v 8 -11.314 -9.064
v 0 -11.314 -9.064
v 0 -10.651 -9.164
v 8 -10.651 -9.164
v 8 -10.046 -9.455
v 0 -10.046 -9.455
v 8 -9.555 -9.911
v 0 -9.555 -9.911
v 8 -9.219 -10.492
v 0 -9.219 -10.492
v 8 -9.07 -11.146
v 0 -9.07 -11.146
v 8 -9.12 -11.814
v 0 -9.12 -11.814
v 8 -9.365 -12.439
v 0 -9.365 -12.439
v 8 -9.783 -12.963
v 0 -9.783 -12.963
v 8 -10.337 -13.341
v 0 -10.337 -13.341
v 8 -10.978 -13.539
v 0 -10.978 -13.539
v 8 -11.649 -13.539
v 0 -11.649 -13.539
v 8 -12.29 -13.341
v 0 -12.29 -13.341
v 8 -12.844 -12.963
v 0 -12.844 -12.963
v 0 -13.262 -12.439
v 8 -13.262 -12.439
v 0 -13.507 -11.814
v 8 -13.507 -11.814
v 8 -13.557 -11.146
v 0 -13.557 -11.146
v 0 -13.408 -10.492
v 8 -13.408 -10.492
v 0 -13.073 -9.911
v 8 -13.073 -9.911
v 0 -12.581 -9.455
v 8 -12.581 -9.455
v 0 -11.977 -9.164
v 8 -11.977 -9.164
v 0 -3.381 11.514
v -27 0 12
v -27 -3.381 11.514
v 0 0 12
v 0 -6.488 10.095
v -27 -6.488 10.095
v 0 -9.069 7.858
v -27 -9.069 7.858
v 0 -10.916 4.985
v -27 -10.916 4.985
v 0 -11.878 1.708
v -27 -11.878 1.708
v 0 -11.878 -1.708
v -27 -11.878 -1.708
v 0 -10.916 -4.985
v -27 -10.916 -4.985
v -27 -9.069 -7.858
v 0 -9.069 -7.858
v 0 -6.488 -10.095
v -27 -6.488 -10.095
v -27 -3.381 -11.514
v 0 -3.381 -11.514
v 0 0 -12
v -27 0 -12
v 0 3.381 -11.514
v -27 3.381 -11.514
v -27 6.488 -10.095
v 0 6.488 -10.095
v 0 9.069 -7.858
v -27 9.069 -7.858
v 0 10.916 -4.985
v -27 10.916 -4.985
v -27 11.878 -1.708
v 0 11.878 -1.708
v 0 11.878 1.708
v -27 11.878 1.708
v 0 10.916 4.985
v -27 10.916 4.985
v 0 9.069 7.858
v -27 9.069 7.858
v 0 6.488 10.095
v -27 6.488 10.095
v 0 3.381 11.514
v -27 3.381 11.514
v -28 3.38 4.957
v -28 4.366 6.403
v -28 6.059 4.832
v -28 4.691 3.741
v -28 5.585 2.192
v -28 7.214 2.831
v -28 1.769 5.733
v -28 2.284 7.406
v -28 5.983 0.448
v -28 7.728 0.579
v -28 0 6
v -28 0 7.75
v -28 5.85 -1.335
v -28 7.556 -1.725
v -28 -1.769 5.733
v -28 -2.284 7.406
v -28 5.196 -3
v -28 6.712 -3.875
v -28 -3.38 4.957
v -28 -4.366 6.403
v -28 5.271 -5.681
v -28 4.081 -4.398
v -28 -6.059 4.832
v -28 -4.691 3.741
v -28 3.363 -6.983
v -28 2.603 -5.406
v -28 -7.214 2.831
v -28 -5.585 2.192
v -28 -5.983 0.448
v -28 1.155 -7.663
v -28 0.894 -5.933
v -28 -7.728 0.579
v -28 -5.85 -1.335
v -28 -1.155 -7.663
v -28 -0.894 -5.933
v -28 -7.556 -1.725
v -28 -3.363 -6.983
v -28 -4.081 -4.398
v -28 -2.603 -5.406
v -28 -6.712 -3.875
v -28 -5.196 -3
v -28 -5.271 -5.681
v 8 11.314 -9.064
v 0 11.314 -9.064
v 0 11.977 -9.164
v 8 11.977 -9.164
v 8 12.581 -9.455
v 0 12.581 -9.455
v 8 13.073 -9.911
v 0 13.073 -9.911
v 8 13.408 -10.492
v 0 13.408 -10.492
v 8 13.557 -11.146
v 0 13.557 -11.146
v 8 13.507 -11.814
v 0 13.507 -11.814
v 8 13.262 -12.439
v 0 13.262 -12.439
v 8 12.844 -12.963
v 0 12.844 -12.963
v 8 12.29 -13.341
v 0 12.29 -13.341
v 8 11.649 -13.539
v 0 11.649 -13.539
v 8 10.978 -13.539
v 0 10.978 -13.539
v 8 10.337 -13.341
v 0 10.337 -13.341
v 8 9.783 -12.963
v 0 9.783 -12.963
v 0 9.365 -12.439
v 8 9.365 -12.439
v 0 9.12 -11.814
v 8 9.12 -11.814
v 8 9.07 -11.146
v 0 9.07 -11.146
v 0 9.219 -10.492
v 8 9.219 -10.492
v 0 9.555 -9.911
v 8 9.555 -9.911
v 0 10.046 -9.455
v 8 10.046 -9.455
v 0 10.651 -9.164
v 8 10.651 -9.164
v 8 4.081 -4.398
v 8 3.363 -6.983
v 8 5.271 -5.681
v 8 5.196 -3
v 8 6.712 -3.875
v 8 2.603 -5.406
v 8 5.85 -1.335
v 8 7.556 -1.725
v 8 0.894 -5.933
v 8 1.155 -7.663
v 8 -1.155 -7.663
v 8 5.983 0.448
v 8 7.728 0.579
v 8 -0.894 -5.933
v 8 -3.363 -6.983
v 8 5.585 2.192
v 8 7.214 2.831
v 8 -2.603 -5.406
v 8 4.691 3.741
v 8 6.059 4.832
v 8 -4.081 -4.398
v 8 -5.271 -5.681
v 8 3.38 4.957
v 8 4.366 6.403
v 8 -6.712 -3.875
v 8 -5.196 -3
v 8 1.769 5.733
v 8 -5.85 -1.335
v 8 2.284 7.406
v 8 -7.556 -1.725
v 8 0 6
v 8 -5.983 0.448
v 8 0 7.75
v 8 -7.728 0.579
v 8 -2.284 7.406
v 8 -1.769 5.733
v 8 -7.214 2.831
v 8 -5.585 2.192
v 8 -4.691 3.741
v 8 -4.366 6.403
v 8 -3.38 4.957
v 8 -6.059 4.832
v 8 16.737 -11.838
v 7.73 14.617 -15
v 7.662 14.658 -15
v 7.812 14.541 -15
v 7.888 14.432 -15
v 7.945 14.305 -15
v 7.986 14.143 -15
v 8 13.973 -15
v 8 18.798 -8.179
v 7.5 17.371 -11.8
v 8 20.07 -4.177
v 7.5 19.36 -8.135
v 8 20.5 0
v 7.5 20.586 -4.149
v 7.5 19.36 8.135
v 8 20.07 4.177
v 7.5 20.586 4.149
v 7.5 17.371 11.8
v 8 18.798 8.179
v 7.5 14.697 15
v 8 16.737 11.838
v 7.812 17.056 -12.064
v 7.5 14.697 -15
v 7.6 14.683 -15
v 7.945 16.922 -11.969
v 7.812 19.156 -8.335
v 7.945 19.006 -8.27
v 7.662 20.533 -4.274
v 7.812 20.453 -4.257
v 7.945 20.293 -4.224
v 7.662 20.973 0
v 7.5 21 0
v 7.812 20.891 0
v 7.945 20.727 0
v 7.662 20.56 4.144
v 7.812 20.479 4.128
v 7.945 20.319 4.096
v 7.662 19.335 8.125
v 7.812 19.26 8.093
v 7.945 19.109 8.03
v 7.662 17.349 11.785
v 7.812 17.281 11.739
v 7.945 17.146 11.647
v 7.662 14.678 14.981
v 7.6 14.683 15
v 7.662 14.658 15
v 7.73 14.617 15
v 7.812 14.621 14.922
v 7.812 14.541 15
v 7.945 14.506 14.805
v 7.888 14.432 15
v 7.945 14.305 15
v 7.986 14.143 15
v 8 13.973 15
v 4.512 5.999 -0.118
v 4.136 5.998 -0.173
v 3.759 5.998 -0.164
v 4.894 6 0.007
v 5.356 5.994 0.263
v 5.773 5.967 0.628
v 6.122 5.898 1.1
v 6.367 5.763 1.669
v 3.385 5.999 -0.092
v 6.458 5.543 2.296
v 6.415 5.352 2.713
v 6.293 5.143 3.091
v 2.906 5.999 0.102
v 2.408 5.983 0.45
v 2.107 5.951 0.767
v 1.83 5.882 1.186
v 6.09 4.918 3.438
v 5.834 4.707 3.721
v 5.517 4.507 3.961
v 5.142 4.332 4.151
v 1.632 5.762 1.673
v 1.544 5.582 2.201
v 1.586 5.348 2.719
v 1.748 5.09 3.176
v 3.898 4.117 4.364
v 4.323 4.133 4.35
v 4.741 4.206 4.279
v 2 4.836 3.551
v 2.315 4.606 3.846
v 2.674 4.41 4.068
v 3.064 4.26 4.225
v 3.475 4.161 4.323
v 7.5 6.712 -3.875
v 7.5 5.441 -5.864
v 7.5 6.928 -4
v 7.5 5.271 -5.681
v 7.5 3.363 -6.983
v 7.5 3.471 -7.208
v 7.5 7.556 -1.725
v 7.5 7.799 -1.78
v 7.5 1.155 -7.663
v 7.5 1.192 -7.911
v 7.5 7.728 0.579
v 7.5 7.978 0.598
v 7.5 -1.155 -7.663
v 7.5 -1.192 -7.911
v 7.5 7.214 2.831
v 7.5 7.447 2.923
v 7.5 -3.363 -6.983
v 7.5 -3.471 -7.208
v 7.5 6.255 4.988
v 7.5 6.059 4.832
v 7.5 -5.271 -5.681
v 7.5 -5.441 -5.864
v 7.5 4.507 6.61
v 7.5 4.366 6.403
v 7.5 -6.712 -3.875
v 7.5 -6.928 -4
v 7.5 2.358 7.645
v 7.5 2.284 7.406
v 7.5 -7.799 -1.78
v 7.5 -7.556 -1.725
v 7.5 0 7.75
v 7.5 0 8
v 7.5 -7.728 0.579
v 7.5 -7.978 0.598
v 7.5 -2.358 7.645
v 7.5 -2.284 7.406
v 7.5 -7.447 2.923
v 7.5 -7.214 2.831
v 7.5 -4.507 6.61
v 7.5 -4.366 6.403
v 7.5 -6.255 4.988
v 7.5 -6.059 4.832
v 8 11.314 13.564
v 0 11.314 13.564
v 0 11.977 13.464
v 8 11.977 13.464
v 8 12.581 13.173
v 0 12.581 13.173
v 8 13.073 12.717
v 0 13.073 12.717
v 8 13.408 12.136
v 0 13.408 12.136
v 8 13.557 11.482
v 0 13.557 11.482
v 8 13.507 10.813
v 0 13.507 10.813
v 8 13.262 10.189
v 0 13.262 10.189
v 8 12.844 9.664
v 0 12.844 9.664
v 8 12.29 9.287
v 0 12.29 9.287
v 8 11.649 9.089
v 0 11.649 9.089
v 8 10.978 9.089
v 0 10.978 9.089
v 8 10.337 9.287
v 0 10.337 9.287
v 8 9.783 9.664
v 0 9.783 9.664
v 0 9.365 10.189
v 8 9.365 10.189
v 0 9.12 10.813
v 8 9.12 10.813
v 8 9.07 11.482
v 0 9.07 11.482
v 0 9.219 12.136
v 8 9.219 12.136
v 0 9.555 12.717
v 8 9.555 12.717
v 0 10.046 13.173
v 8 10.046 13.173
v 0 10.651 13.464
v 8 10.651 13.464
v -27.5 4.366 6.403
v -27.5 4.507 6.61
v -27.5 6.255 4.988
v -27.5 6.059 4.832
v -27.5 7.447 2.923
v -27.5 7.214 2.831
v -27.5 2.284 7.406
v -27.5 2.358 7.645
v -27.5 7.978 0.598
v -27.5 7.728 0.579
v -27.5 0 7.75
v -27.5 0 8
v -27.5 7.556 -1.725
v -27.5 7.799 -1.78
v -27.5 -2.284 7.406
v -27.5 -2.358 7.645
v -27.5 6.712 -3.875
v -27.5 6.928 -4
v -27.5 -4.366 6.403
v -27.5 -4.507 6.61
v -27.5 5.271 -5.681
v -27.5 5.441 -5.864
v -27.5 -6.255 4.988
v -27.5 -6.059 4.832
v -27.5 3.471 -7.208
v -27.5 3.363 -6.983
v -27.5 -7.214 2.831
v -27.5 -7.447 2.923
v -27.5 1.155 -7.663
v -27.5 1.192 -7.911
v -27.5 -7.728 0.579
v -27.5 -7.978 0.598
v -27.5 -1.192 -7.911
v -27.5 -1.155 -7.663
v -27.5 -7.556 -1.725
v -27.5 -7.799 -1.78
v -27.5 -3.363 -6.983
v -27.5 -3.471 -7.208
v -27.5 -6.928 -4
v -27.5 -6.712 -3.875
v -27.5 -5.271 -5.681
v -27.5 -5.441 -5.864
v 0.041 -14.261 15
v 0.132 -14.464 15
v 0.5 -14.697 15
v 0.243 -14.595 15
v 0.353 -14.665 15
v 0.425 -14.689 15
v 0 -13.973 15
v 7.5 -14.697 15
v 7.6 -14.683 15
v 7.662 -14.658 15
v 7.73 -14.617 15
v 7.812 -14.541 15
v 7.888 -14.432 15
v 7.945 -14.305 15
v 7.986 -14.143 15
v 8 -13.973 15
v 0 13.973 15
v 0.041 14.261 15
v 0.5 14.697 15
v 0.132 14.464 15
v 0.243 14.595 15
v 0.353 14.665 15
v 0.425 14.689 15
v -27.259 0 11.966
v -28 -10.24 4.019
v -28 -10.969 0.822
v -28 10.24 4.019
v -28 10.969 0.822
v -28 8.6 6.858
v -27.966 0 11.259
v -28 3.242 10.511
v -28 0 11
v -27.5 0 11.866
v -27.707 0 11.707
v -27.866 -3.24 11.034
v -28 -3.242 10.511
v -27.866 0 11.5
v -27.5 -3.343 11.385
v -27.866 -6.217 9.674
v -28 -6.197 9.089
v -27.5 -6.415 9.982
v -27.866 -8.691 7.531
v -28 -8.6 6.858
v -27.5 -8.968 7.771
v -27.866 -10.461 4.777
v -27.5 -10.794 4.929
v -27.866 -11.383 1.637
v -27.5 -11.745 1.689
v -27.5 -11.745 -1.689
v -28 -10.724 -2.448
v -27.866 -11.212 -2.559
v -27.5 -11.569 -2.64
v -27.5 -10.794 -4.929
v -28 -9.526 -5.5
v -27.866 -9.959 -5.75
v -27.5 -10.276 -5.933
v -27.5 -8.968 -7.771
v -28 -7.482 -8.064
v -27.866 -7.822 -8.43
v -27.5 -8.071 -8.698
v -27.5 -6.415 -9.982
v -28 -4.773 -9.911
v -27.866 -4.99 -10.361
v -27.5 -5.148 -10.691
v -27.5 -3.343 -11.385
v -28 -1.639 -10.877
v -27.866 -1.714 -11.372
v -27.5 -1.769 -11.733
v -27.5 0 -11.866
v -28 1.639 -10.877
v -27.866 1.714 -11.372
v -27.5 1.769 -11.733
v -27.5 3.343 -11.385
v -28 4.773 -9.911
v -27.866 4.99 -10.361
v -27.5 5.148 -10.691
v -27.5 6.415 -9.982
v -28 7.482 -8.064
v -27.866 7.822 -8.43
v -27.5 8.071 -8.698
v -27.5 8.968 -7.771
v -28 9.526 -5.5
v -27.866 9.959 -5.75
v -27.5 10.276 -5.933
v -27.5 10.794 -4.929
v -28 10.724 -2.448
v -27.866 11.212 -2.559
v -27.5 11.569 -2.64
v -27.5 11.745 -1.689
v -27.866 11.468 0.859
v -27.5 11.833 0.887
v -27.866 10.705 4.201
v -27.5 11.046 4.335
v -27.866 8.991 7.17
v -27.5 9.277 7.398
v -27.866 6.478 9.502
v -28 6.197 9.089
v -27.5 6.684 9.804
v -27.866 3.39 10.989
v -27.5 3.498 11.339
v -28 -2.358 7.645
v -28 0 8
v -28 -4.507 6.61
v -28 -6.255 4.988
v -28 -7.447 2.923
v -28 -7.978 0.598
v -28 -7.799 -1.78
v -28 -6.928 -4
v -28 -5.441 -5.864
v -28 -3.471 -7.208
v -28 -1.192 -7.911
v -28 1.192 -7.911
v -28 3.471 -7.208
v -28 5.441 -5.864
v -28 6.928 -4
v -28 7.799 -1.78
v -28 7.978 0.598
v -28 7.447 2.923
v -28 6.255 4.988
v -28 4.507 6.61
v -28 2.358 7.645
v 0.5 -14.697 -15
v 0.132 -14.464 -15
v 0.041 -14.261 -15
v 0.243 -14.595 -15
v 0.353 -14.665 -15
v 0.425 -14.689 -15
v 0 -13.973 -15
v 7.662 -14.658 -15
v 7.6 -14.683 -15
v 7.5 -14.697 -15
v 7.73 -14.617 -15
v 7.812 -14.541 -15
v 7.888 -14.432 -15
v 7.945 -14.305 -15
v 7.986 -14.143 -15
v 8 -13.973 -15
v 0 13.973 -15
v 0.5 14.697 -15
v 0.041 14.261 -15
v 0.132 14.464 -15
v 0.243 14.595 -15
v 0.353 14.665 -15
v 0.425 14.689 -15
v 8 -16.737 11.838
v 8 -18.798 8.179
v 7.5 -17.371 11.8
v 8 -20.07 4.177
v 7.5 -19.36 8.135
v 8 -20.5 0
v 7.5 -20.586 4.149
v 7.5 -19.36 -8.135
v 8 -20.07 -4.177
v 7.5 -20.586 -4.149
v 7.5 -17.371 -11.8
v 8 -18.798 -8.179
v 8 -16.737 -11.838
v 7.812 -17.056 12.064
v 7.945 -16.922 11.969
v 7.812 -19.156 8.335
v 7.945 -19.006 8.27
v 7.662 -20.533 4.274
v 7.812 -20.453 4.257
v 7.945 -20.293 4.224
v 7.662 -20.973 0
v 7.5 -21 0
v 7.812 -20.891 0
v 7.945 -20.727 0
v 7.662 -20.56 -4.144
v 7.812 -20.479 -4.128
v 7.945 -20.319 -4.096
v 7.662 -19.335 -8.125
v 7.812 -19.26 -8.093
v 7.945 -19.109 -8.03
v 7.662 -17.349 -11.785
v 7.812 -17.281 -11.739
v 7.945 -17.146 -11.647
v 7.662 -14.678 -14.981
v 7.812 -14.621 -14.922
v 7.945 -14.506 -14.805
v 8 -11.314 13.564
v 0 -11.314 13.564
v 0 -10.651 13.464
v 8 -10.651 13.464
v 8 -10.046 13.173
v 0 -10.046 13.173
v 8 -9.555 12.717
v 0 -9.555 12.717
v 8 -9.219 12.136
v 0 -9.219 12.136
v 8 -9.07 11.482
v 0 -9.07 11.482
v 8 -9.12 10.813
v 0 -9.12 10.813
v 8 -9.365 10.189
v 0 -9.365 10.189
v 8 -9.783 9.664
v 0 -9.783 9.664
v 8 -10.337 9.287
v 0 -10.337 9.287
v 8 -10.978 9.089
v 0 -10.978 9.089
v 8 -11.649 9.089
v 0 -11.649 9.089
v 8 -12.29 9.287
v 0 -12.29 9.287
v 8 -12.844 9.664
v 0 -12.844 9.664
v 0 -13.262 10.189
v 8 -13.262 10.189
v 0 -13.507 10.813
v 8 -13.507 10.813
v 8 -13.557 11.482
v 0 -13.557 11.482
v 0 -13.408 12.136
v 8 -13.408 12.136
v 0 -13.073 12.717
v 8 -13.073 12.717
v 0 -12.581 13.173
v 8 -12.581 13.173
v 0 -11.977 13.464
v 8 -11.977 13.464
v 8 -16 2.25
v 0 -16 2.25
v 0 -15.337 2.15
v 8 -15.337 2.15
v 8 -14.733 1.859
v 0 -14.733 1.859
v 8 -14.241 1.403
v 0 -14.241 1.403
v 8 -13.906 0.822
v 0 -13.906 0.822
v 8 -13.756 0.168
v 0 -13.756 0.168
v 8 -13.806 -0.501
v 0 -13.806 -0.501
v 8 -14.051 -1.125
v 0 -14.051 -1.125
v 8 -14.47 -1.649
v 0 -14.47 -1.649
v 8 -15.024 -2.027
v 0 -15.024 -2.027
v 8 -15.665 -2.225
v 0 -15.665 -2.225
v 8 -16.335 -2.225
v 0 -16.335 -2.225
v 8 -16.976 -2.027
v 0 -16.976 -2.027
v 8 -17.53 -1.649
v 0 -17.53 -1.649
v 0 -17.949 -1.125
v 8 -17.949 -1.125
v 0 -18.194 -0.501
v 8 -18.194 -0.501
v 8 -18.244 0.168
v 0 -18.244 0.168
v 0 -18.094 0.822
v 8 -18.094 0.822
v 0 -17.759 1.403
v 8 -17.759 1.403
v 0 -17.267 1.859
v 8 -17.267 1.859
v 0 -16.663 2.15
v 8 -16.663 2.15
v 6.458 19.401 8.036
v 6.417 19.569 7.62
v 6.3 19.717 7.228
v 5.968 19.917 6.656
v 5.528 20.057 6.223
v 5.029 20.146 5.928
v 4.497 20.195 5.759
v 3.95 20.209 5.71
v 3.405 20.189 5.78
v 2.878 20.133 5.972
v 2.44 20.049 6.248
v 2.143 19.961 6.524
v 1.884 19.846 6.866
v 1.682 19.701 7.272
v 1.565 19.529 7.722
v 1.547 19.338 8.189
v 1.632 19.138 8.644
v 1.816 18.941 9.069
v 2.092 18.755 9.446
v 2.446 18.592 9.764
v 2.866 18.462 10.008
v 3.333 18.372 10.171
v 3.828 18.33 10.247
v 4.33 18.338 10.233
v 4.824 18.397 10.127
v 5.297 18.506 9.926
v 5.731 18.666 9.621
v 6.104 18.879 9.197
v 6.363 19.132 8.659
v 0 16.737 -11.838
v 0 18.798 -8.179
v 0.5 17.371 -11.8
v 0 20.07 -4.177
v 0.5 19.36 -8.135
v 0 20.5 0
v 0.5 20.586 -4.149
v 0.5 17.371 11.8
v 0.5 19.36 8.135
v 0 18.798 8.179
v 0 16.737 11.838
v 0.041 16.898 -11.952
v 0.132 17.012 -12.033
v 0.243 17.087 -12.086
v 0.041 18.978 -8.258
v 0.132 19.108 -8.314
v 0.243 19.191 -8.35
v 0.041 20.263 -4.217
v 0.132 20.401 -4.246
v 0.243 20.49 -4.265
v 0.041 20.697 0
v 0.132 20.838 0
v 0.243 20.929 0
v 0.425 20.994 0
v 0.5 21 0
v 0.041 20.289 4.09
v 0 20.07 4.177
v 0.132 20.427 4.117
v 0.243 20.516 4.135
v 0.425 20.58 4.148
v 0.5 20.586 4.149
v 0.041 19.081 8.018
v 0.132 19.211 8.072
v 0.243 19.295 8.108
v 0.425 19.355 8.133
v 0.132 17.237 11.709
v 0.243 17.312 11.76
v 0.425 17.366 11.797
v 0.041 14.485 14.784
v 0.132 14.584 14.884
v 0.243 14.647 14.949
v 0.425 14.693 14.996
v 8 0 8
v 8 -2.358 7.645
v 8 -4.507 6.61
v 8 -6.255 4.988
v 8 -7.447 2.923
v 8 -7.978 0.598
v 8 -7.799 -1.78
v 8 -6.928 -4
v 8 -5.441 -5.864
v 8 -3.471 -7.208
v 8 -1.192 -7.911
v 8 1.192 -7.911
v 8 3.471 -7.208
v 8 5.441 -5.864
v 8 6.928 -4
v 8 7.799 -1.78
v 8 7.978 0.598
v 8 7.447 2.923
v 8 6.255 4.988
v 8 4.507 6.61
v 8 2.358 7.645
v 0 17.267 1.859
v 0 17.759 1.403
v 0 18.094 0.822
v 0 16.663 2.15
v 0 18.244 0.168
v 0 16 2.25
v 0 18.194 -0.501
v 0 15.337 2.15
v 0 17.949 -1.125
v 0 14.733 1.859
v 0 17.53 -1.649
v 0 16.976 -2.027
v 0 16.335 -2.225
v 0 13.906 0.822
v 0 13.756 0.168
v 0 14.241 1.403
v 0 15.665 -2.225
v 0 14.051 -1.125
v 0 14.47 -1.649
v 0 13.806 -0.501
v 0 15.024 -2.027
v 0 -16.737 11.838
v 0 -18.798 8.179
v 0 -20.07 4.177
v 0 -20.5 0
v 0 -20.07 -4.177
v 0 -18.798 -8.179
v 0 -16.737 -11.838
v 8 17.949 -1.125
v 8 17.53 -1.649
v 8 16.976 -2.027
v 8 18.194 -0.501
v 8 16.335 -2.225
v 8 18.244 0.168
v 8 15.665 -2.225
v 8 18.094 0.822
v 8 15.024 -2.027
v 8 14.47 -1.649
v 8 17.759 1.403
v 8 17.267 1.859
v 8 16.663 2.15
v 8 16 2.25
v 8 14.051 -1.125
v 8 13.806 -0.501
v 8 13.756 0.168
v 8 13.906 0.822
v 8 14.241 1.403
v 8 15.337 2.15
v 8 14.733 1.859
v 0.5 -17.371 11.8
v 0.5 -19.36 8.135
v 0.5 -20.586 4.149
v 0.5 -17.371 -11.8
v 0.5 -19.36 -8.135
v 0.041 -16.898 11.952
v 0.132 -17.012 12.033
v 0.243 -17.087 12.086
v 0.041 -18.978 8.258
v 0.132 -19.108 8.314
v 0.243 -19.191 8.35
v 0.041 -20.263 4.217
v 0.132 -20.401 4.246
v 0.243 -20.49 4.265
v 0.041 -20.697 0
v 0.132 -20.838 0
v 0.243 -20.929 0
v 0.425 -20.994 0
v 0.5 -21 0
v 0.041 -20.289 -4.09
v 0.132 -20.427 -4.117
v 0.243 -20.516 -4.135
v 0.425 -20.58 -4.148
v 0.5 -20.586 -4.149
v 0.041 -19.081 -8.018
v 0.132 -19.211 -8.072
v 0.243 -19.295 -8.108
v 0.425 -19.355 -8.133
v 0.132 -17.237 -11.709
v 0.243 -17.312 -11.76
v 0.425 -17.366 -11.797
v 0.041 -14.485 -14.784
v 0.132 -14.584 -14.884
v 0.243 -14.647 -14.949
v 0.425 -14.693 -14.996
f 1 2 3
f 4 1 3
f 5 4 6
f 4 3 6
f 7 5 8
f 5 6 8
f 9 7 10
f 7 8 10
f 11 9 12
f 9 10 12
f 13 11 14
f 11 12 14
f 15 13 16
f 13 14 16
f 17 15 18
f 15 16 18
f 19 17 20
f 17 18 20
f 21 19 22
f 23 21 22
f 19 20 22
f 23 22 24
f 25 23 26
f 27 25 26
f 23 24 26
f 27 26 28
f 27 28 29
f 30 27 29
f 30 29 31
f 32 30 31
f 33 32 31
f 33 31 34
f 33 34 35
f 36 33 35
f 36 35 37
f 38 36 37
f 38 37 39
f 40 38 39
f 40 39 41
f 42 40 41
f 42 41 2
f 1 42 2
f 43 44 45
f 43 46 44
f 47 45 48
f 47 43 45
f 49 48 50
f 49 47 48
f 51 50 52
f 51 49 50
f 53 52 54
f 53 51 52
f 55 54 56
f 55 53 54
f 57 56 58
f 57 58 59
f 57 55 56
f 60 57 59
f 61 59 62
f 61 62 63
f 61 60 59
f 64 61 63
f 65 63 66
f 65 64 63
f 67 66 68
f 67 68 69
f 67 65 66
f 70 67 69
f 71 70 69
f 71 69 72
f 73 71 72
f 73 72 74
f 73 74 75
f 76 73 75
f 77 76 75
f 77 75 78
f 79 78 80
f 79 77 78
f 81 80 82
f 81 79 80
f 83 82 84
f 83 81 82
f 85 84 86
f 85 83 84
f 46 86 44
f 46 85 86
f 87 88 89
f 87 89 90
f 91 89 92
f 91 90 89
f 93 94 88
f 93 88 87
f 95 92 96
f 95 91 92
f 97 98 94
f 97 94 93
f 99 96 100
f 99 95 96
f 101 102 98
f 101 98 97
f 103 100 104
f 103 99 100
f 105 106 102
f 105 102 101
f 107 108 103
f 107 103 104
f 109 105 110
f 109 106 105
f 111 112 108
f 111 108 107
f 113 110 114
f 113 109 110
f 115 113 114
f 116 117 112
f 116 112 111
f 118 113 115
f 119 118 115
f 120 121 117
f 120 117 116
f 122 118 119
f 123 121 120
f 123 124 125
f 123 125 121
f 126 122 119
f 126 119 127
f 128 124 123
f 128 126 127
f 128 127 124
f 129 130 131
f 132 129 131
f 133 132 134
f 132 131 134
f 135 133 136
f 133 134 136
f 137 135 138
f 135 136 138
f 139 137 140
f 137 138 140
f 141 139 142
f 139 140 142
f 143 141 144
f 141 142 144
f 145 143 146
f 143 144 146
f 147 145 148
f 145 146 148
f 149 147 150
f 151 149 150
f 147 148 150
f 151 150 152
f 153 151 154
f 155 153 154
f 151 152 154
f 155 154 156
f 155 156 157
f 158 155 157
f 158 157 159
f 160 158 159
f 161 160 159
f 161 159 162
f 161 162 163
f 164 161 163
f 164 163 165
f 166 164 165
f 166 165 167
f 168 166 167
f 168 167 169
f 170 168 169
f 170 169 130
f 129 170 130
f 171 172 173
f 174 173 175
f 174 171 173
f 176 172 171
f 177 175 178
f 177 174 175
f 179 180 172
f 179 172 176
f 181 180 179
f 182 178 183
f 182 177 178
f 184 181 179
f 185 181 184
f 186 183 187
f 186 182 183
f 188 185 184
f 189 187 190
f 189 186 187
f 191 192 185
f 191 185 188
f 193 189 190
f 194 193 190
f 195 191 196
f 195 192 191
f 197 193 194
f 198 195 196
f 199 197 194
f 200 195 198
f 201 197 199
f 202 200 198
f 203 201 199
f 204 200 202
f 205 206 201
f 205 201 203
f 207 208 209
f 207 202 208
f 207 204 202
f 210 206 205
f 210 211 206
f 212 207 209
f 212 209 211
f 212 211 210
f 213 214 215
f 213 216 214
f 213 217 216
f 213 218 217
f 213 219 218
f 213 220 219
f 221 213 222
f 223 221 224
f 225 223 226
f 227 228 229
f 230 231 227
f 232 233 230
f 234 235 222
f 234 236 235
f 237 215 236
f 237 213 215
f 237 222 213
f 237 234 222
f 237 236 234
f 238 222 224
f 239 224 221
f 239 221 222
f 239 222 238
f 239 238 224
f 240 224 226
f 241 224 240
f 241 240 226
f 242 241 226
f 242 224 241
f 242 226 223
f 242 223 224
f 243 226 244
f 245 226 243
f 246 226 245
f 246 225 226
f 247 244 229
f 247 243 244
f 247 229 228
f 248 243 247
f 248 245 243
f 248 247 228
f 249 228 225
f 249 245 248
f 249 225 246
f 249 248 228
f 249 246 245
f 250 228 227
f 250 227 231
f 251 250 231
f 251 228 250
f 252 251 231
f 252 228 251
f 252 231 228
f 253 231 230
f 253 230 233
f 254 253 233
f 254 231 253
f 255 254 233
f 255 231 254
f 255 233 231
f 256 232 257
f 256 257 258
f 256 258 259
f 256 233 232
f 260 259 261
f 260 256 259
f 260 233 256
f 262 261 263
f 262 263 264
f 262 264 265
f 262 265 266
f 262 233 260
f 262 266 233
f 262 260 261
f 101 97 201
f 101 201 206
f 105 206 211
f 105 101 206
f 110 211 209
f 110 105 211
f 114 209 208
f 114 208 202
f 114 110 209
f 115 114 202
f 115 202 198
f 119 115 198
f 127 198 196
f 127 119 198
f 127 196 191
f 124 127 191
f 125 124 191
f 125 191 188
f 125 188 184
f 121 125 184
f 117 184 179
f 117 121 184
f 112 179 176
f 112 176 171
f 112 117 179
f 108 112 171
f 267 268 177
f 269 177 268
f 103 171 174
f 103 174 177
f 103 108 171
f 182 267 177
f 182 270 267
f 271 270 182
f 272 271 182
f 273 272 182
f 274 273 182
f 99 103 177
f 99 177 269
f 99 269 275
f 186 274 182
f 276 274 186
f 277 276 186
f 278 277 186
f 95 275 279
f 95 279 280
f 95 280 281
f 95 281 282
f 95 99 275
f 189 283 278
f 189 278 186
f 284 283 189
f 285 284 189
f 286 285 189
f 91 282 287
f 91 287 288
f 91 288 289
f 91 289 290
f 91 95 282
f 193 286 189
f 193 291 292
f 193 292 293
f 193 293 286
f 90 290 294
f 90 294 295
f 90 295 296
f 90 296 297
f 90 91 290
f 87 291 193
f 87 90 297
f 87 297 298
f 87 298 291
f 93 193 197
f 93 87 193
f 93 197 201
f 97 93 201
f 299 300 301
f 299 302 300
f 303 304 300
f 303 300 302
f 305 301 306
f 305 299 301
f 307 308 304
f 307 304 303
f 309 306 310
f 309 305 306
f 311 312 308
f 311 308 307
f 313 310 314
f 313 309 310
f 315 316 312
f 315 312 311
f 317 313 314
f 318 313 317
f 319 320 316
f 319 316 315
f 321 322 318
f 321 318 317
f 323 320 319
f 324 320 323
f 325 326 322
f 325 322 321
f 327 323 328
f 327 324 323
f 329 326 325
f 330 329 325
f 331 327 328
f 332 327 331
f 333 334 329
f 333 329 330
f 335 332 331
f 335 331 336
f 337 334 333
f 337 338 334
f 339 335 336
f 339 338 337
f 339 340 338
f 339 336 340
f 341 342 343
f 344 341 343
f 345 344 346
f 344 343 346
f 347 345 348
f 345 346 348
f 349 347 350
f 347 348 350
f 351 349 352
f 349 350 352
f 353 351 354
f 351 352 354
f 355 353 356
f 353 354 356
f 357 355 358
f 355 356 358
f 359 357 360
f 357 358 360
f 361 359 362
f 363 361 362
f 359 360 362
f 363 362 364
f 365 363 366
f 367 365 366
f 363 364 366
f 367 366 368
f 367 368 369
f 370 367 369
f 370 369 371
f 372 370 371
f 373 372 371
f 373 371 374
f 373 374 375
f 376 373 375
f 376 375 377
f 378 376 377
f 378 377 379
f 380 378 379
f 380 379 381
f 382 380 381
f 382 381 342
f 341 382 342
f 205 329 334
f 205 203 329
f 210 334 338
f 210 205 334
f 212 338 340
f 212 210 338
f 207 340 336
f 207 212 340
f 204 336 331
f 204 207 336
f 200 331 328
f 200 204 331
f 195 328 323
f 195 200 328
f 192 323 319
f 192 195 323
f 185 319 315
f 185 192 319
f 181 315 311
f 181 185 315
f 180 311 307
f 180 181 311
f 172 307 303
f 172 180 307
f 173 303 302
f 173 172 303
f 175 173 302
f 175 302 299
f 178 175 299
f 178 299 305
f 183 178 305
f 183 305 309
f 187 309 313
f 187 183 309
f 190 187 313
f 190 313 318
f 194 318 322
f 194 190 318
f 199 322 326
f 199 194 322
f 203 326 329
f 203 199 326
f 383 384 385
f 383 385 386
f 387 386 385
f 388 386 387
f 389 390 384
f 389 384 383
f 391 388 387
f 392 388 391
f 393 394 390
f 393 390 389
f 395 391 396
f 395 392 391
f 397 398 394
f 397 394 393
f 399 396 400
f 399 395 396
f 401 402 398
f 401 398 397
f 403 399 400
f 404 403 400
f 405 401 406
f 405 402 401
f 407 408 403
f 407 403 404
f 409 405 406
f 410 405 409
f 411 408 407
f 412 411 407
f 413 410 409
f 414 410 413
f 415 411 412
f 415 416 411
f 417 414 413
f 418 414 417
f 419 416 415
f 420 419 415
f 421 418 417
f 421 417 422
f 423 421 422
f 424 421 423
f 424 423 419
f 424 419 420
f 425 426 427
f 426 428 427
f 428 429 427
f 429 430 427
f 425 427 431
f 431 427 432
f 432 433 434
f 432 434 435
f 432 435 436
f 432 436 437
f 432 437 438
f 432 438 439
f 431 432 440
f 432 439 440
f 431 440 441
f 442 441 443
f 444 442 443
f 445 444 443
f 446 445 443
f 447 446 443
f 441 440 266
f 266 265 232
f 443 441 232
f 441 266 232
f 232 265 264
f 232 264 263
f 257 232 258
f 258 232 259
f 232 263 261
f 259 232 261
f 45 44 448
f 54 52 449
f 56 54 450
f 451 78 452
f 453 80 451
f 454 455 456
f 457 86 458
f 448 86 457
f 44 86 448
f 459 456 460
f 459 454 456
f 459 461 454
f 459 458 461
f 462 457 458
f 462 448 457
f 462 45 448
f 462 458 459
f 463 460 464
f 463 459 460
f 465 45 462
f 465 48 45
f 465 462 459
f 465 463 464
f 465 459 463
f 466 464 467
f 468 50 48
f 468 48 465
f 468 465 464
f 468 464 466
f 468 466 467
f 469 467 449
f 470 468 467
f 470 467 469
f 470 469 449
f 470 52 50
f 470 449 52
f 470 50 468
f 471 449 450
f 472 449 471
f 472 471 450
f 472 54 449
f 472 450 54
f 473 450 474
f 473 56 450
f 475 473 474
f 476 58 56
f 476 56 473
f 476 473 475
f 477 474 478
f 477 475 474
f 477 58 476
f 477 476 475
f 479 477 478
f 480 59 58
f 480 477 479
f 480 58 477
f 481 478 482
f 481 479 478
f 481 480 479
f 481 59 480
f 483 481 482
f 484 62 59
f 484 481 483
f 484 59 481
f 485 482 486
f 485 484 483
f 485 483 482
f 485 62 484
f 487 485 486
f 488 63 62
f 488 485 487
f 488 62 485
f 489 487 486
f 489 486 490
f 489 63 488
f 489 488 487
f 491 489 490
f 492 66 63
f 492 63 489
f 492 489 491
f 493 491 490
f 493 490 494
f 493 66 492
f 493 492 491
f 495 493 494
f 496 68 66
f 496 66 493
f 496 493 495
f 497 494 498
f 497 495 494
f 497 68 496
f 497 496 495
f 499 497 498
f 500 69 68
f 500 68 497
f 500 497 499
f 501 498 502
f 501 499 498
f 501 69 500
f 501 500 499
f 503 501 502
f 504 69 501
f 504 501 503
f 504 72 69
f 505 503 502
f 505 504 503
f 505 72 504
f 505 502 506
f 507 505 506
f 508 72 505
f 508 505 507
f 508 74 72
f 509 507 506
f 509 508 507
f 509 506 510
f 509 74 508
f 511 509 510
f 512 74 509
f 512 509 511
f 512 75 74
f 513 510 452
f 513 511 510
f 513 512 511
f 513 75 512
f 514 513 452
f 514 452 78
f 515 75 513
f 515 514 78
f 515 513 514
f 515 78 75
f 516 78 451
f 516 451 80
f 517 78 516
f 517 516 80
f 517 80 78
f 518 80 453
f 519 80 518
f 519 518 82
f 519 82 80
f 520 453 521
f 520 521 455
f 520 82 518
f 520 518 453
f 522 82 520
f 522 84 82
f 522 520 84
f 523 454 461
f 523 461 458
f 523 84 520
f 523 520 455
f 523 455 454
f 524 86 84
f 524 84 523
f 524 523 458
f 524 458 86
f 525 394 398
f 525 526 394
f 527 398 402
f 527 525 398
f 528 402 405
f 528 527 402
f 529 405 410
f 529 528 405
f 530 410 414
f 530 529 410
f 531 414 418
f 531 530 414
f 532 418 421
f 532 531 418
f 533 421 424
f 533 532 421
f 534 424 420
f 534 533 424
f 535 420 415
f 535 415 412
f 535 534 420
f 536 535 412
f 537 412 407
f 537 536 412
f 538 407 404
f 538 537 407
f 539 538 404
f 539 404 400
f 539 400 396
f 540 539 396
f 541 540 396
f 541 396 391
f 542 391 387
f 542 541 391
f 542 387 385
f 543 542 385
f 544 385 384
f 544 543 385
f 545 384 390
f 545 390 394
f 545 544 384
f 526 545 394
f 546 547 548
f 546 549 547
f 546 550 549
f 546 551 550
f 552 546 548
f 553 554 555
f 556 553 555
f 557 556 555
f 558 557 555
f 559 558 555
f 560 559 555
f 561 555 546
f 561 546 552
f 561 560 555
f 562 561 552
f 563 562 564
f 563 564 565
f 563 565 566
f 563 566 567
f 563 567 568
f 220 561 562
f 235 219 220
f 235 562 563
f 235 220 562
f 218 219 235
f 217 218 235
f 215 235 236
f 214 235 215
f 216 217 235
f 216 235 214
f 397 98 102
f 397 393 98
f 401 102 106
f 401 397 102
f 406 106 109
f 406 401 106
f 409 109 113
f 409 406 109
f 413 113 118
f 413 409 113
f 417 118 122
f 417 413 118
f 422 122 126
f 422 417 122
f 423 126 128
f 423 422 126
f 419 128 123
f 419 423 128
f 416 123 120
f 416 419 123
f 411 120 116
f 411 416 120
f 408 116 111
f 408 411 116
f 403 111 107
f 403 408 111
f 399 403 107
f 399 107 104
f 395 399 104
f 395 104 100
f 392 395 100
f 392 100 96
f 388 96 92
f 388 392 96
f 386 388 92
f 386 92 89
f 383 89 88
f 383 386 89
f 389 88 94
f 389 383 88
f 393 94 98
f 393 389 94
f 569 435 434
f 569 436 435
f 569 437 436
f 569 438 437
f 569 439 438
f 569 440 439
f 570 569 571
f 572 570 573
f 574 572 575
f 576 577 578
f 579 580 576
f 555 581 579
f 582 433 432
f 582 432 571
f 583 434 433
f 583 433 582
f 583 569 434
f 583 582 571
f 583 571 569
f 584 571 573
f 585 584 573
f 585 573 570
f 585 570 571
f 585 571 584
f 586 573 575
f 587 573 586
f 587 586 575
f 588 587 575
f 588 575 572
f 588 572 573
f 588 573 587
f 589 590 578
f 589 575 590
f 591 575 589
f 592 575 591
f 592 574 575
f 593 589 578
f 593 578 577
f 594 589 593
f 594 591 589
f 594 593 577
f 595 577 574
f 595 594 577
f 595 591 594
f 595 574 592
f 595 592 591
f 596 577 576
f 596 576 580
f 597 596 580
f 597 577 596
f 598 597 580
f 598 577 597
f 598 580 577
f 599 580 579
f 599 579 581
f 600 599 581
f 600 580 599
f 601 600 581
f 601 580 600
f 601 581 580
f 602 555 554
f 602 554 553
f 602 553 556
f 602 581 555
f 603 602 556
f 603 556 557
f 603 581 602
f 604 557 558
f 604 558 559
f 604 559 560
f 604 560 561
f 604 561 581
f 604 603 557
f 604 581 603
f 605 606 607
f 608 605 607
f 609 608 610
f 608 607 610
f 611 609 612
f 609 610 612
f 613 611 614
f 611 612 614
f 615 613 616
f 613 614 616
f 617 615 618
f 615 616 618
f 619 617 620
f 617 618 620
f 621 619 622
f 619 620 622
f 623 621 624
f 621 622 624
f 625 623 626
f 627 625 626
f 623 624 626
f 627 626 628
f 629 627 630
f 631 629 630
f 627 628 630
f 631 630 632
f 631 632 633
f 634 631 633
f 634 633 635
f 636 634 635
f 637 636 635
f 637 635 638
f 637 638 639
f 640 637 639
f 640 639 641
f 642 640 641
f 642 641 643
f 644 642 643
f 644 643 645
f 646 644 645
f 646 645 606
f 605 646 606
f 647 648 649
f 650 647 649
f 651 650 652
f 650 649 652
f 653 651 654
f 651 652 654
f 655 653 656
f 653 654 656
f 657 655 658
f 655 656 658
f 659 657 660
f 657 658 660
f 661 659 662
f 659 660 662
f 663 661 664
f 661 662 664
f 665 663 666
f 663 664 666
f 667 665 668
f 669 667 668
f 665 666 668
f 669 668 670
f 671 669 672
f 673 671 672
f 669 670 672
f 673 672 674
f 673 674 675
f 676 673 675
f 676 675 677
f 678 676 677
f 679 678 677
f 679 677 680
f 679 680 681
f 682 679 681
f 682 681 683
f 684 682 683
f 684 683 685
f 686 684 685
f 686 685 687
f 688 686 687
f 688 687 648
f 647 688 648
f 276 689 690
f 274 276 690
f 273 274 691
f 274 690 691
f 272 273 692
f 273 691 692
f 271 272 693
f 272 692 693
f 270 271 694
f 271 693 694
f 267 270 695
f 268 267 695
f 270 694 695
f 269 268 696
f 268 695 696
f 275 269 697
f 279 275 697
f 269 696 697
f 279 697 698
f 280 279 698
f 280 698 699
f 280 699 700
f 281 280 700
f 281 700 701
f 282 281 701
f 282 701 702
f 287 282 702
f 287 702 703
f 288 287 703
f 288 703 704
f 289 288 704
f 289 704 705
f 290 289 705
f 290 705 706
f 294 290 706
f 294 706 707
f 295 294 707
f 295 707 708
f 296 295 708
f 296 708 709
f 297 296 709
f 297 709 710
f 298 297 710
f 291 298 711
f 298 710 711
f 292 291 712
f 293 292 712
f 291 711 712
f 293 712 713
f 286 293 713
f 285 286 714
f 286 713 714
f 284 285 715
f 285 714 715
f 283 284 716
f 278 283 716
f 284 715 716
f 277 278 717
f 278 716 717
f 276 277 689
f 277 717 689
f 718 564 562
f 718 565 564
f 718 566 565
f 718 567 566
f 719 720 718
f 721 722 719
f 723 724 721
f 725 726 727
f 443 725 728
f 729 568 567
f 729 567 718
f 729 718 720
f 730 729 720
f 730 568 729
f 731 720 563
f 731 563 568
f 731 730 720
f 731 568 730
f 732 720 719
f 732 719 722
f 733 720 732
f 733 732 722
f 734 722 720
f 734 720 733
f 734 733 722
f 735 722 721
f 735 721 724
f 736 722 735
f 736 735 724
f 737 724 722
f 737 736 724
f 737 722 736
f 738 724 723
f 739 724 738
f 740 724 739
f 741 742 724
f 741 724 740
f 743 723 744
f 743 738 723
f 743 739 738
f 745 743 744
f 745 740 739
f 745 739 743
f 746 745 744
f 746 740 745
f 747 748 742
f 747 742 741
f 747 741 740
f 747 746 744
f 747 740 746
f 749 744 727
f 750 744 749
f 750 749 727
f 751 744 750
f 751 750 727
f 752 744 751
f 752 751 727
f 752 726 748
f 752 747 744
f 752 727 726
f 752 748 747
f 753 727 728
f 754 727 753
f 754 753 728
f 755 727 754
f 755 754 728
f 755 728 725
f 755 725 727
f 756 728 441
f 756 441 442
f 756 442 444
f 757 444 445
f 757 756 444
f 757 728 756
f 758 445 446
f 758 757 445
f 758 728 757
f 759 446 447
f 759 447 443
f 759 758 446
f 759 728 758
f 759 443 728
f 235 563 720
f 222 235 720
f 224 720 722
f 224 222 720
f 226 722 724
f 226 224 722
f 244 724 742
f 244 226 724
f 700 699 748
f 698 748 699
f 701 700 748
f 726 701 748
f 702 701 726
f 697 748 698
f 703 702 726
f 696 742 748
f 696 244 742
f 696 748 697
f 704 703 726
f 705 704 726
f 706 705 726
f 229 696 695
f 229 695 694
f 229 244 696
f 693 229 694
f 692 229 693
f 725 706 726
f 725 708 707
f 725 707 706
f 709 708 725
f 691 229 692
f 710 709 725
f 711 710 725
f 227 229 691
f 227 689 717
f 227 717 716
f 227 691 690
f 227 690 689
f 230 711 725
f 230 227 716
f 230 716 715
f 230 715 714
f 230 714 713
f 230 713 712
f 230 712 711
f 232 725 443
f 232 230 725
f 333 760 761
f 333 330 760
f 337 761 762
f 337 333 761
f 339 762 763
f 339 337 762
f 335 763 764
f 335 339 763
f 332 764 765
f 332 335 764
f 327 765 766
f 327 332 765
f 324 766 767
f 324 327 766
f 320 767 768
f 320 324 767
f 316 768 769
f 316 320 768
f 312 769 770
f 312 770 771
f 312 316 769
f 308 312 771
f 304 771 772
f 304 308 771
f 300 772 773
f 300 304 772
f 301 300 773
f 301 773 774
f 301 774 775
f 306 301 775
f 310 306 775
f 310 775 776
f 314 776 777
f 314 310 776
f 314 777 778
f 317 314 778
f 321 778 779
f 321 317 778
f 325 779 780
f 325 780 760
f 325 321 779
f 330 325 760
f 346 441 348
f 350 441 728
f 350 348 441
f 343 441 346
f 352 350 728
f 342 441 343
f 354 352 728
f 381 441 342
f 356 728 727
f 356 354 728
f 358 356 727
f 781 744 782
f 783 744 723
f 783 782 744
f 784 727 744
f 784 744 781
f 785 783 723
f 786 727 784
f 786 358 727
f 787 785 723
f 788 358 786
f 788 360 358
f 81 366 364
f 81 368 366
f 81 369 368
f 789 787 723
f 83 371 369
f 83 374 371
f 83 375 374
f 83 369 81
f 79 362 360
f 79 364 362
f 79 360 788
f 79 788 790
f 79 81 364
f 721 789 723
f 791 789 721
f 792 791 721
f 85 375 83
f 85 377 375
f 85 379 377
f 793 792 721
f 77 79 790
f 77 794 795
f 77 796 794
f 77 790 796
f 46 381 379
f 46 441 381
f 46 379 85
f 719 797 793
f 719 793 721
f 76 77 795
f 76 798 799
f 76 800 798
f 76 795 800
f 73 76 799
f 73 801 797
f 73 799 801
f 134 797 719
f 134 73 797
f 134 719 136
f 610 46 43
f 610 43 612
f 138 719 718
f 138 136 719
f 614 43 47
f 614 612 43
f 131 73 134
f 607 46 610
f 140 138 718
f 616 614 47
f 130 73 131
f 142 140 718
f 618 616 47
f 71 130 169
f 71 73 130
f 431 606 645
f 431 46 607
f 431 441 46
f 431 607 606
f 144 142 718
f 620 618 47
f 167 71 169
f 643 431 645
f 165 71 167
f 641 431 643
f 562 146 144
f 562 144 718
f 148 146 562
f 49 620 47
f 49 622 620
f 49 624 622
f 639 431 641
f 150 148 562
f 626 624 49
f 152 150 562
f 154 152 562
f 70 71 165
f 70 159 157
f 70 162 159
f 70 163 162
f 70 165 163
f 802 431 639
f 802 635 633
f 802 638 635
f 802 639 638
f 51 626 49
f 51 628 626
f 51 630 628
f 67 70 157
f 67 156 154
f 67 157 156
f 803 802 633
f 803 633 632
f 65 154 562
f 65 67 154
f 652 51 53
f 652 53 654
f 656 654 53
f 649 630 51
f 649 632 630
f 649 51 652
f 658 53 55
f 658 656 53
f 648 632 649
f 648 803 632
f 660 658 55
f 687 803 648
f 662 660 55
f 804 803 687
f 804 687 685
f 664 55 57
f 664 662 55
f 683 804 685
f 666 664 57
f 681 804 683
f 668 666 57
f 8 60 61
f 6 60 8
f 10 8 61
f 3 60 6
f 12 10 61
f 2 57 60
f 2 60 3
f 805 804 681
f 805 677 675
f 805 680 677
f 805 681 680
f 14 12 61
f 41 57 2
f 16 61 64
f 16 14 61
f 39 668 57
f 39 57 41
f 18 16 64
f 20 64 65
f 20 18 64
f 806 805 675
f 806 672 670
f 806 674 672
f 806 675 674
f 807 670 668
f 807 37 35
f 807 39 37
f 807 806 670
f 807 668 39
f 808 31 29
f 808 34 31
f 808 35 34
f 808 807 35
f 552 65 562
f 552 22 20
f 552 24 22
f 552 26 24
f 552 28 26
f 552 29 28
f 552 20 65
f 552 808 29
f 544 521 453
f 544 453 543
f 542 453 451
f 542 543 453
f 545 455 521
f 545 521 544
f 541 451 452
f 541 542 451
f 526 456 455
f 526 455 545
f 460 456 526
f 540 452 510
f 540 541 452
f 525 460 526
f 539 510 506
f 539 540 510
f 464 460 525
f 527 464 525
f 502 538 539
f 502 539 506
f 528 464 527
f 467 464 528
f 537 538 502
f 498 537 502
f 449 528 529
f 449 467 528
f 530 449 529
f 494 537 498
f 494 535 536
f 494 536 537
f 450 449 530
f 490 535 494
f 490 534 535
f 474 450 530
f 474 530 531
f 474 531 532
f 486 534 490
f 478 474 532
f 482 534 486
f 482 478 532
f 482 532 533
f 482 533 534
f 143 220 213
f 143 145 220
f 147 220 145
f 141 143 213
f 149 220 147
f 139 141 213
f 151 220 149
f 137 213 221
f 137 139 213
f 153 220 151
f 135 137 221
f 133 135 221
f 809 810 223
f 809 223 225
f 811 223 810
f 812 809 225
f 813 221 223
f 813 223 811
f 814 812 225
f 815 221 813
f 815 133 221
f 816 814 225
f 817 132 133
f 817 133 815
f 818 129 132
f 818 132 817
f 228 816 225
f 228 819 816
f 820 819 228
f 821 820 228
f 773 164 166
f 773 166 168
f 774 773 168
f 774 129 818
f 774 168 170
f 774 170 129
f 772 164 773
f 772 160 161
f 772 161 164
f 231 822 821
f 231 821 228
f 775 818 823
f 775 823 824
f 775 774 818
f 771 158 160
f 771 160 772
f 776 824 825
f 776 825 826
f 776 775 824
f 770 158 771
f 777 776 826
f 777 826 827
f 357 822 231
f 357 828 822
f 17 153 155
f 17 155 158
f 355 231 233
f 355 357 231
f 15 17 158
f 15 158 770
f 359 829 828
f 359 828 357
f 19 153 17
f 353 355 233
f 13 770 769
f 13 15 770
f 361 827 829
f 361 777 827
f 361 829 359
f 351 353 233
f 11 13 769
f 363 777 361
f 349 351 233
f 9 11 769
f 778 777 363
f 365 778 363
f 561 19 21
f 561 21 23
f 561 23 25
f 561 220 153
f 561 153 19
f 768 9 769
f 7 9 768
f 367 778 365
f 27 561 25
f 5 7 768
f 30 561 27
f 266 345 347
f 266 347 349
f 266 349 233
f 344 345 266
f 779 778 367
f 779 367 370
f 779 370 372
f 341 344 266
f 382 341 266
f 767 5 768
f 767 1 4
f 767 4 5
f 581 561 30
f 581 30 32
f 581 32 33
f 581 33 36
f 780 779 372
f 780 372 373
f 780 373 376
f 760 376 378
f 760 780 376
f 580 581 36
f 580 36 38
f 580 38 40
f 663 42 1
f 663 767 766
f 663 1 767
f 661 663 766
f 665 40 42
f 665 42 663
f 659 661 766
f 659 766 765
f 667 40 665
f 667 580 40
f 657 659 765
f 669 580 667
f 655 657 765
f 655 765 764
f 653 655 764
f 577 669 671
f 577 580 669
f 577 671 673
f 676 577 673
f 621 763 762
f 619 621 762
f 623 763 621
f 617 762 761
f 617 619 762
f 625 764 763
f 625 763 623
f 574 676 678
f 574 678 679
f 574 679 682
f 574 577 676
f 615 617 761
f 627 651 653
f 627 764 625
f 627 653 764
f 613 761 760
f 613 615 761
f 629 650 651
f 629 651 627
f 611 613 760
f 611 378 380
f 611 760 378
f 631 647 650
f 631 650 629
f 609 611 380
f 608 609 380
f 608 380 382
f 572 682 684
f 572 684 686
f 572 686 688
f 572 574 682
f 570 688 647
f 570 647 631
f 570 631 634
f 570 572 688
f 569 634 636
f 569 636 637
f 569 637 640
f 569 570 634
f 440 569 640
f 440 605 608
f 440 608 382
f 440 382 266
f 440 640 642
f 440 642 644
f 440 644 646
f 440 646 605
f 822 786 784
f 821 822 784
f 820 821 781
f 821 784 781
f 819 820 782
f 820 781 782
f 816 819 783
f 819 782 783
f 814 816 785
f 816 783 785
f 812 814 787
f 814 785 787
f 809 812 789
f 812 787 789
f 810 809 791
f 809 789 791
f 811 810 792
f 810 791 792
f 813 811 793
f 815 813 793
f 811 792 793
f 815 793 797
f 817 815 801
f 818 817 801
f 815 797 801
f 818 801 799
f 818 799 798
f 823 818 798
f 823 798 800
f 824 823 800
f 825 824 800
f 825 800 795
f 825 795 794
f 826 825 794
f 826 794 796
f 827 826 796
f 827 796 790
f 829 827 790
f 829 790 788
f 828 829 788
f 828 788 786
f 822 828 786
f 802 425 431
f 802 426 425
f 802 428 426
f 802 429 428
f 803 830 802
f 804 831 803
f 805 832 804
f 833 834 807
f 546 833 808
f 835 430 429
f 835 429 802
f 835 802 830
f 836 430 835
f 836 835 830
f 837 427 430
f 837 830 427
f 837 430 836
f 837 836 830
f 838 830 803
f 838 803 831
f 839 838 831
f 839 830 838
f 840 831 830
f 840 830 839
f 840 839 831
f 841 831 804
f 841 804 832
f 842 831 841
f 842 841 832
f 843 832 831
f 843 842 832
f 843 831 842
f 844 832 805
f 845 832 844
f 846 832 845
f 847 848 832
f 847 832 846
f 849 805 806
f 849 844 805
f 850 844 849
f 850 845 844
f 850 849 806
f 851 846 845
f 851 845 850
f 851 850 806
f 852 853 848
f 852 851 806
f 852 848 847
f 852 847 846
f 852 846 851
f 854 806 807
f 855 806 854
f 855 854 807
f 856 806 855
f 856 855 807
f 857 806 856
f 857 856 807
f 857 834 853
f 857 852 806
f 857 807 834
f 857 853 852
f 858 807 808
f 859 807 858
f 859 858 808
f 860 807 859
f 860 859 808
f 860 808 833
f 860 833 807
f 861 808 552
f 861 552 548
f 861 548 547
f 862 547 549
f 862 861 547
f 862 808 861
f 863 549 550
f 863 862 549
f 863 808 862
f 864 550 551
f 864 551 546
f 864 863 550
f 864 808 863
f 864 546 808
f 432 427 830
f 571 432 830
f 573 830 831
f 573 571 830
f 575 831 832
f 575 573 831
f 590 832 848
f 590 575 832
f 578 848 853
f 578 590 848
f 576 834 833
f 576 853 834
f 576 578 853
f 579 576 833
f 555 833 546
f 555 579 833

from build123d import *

# Parameters (mm, degrees)
SKETCH2_OUTSIDE_W   = 57.892
SKETCH2_OUTSIDE_H   = 57.892
SKETCH2_OUTSIDE_W_2 = 30
SKETCH2_OUTSIDE_H_2 = 42
CUT_EXTRUDE1_DEPTH  = 10
DIAMETERHOLE1_D     = 4.5
TAP1_REACH          = 56.286
TAP1_BORE_R         = 2.4585


with BuildPart() as part:
    # Sketch1 → Revolve1 (revolve)
    with BuildSketch(Plane.XY, mode=Mode.PRIVATE) as revolve1_sk:
        with BuildLine():
            Line((-28, 8), (-28, 11))
            ThreePointArc((-28, 11), (-27.707106781, 11.707106781), (-27, 12))
            Line((-27, 12), (0, 12))
            Line((0, 12), (0, 20.5))
            ThreePointArc((0, 20.5), (0.146446609, 20.853553391), (0.5, 21))
            Line((0.5, 21), (7.5, 21))
            ThreePointArc((7.5, 21), (7.853553391, 20.853553391), (8, 20.5))
            Line((8, 20.5), (8, 8))
            Line((8, 8), (7.5, 8))
            Line((7.5, 8), (7.5, 7.75))
            Line((7.5, 7.75), (8, 7.75))
            Line((8, 7.75), (8, 6))
            Line((8, 6), (-28, 6))
            Line((-28, 6), (-28, 7.75))
            Line((-28, 7.75), (-27.5, 7.75))
            Line((-27.5, 7.75), (-27.5, 8))
            Line((-27.5, 8), (-28, 8))
        make_face()
    revolve(revolve1_sk.sketch.rotate(Axis((-29.8, 0, 0), (1, 0, 0)), 90), axis=Axis((-29.8, 0, 0), (1, 0, 0)))

    # Sketch2 outside → Cut-Extrude1 (cut)
    with BuildSketch(Plane(origin=(8, 0, 0), x_dir=(0, 0, -1), z_dir=(1, 0, 0))):
        Rectangle(SKETCH2_OUTSIDE_W, SKETCH2_OUTSIDE_H)
        Rectangle(SKETCH2_OUTSIDE_W_2, SKETCH2_OUTSIDE_H_2, mode=Mode.SUBTRACT)
    extrude(amount=-CUT_EXTRUDE1_DEPTH, mode=Mode.SUBTRACT)

    # DiameterHole1 (through all)
    with Locations(Plane(origin=(8, 0, 0), x_dir=(0, 0, -1), z_dir=(1, 0, 0))):
        with Locations((11.313708499, 11.313708499), (0, 16), (-11.313708499, 11.313708499), (-11.313708499, -11.313708499), (0, -16), (11.313708499, -11.313708499)):
            Hole(DIAMETERHOLE1_D / 2)

    # Tap1 bore → Tap1 (cut, up to next)
    with BuildSketch(Plane(origin=(0, 19.401470183, 8.03635208), x_dir=(1, 0, 0), z_dir=(0, 0.9238795325112865, 0.3826834323650906)), mode=Mode.PRIVATE) as tap1_sk1:
        with Locations((4, 0)):
            Circle(TAP1_BORE_R)
    tap1_tool1 = extrude(tap1_sk1.sketch, amount=-TAP1_REACH, mode=Mode.PRIVATE) & part.part
    add(tap1_tool1.solids().sort_by_distance((4, 19.40147, 8.036352))[0], mode=Mode.SUBTRACT)


solid = part.part
